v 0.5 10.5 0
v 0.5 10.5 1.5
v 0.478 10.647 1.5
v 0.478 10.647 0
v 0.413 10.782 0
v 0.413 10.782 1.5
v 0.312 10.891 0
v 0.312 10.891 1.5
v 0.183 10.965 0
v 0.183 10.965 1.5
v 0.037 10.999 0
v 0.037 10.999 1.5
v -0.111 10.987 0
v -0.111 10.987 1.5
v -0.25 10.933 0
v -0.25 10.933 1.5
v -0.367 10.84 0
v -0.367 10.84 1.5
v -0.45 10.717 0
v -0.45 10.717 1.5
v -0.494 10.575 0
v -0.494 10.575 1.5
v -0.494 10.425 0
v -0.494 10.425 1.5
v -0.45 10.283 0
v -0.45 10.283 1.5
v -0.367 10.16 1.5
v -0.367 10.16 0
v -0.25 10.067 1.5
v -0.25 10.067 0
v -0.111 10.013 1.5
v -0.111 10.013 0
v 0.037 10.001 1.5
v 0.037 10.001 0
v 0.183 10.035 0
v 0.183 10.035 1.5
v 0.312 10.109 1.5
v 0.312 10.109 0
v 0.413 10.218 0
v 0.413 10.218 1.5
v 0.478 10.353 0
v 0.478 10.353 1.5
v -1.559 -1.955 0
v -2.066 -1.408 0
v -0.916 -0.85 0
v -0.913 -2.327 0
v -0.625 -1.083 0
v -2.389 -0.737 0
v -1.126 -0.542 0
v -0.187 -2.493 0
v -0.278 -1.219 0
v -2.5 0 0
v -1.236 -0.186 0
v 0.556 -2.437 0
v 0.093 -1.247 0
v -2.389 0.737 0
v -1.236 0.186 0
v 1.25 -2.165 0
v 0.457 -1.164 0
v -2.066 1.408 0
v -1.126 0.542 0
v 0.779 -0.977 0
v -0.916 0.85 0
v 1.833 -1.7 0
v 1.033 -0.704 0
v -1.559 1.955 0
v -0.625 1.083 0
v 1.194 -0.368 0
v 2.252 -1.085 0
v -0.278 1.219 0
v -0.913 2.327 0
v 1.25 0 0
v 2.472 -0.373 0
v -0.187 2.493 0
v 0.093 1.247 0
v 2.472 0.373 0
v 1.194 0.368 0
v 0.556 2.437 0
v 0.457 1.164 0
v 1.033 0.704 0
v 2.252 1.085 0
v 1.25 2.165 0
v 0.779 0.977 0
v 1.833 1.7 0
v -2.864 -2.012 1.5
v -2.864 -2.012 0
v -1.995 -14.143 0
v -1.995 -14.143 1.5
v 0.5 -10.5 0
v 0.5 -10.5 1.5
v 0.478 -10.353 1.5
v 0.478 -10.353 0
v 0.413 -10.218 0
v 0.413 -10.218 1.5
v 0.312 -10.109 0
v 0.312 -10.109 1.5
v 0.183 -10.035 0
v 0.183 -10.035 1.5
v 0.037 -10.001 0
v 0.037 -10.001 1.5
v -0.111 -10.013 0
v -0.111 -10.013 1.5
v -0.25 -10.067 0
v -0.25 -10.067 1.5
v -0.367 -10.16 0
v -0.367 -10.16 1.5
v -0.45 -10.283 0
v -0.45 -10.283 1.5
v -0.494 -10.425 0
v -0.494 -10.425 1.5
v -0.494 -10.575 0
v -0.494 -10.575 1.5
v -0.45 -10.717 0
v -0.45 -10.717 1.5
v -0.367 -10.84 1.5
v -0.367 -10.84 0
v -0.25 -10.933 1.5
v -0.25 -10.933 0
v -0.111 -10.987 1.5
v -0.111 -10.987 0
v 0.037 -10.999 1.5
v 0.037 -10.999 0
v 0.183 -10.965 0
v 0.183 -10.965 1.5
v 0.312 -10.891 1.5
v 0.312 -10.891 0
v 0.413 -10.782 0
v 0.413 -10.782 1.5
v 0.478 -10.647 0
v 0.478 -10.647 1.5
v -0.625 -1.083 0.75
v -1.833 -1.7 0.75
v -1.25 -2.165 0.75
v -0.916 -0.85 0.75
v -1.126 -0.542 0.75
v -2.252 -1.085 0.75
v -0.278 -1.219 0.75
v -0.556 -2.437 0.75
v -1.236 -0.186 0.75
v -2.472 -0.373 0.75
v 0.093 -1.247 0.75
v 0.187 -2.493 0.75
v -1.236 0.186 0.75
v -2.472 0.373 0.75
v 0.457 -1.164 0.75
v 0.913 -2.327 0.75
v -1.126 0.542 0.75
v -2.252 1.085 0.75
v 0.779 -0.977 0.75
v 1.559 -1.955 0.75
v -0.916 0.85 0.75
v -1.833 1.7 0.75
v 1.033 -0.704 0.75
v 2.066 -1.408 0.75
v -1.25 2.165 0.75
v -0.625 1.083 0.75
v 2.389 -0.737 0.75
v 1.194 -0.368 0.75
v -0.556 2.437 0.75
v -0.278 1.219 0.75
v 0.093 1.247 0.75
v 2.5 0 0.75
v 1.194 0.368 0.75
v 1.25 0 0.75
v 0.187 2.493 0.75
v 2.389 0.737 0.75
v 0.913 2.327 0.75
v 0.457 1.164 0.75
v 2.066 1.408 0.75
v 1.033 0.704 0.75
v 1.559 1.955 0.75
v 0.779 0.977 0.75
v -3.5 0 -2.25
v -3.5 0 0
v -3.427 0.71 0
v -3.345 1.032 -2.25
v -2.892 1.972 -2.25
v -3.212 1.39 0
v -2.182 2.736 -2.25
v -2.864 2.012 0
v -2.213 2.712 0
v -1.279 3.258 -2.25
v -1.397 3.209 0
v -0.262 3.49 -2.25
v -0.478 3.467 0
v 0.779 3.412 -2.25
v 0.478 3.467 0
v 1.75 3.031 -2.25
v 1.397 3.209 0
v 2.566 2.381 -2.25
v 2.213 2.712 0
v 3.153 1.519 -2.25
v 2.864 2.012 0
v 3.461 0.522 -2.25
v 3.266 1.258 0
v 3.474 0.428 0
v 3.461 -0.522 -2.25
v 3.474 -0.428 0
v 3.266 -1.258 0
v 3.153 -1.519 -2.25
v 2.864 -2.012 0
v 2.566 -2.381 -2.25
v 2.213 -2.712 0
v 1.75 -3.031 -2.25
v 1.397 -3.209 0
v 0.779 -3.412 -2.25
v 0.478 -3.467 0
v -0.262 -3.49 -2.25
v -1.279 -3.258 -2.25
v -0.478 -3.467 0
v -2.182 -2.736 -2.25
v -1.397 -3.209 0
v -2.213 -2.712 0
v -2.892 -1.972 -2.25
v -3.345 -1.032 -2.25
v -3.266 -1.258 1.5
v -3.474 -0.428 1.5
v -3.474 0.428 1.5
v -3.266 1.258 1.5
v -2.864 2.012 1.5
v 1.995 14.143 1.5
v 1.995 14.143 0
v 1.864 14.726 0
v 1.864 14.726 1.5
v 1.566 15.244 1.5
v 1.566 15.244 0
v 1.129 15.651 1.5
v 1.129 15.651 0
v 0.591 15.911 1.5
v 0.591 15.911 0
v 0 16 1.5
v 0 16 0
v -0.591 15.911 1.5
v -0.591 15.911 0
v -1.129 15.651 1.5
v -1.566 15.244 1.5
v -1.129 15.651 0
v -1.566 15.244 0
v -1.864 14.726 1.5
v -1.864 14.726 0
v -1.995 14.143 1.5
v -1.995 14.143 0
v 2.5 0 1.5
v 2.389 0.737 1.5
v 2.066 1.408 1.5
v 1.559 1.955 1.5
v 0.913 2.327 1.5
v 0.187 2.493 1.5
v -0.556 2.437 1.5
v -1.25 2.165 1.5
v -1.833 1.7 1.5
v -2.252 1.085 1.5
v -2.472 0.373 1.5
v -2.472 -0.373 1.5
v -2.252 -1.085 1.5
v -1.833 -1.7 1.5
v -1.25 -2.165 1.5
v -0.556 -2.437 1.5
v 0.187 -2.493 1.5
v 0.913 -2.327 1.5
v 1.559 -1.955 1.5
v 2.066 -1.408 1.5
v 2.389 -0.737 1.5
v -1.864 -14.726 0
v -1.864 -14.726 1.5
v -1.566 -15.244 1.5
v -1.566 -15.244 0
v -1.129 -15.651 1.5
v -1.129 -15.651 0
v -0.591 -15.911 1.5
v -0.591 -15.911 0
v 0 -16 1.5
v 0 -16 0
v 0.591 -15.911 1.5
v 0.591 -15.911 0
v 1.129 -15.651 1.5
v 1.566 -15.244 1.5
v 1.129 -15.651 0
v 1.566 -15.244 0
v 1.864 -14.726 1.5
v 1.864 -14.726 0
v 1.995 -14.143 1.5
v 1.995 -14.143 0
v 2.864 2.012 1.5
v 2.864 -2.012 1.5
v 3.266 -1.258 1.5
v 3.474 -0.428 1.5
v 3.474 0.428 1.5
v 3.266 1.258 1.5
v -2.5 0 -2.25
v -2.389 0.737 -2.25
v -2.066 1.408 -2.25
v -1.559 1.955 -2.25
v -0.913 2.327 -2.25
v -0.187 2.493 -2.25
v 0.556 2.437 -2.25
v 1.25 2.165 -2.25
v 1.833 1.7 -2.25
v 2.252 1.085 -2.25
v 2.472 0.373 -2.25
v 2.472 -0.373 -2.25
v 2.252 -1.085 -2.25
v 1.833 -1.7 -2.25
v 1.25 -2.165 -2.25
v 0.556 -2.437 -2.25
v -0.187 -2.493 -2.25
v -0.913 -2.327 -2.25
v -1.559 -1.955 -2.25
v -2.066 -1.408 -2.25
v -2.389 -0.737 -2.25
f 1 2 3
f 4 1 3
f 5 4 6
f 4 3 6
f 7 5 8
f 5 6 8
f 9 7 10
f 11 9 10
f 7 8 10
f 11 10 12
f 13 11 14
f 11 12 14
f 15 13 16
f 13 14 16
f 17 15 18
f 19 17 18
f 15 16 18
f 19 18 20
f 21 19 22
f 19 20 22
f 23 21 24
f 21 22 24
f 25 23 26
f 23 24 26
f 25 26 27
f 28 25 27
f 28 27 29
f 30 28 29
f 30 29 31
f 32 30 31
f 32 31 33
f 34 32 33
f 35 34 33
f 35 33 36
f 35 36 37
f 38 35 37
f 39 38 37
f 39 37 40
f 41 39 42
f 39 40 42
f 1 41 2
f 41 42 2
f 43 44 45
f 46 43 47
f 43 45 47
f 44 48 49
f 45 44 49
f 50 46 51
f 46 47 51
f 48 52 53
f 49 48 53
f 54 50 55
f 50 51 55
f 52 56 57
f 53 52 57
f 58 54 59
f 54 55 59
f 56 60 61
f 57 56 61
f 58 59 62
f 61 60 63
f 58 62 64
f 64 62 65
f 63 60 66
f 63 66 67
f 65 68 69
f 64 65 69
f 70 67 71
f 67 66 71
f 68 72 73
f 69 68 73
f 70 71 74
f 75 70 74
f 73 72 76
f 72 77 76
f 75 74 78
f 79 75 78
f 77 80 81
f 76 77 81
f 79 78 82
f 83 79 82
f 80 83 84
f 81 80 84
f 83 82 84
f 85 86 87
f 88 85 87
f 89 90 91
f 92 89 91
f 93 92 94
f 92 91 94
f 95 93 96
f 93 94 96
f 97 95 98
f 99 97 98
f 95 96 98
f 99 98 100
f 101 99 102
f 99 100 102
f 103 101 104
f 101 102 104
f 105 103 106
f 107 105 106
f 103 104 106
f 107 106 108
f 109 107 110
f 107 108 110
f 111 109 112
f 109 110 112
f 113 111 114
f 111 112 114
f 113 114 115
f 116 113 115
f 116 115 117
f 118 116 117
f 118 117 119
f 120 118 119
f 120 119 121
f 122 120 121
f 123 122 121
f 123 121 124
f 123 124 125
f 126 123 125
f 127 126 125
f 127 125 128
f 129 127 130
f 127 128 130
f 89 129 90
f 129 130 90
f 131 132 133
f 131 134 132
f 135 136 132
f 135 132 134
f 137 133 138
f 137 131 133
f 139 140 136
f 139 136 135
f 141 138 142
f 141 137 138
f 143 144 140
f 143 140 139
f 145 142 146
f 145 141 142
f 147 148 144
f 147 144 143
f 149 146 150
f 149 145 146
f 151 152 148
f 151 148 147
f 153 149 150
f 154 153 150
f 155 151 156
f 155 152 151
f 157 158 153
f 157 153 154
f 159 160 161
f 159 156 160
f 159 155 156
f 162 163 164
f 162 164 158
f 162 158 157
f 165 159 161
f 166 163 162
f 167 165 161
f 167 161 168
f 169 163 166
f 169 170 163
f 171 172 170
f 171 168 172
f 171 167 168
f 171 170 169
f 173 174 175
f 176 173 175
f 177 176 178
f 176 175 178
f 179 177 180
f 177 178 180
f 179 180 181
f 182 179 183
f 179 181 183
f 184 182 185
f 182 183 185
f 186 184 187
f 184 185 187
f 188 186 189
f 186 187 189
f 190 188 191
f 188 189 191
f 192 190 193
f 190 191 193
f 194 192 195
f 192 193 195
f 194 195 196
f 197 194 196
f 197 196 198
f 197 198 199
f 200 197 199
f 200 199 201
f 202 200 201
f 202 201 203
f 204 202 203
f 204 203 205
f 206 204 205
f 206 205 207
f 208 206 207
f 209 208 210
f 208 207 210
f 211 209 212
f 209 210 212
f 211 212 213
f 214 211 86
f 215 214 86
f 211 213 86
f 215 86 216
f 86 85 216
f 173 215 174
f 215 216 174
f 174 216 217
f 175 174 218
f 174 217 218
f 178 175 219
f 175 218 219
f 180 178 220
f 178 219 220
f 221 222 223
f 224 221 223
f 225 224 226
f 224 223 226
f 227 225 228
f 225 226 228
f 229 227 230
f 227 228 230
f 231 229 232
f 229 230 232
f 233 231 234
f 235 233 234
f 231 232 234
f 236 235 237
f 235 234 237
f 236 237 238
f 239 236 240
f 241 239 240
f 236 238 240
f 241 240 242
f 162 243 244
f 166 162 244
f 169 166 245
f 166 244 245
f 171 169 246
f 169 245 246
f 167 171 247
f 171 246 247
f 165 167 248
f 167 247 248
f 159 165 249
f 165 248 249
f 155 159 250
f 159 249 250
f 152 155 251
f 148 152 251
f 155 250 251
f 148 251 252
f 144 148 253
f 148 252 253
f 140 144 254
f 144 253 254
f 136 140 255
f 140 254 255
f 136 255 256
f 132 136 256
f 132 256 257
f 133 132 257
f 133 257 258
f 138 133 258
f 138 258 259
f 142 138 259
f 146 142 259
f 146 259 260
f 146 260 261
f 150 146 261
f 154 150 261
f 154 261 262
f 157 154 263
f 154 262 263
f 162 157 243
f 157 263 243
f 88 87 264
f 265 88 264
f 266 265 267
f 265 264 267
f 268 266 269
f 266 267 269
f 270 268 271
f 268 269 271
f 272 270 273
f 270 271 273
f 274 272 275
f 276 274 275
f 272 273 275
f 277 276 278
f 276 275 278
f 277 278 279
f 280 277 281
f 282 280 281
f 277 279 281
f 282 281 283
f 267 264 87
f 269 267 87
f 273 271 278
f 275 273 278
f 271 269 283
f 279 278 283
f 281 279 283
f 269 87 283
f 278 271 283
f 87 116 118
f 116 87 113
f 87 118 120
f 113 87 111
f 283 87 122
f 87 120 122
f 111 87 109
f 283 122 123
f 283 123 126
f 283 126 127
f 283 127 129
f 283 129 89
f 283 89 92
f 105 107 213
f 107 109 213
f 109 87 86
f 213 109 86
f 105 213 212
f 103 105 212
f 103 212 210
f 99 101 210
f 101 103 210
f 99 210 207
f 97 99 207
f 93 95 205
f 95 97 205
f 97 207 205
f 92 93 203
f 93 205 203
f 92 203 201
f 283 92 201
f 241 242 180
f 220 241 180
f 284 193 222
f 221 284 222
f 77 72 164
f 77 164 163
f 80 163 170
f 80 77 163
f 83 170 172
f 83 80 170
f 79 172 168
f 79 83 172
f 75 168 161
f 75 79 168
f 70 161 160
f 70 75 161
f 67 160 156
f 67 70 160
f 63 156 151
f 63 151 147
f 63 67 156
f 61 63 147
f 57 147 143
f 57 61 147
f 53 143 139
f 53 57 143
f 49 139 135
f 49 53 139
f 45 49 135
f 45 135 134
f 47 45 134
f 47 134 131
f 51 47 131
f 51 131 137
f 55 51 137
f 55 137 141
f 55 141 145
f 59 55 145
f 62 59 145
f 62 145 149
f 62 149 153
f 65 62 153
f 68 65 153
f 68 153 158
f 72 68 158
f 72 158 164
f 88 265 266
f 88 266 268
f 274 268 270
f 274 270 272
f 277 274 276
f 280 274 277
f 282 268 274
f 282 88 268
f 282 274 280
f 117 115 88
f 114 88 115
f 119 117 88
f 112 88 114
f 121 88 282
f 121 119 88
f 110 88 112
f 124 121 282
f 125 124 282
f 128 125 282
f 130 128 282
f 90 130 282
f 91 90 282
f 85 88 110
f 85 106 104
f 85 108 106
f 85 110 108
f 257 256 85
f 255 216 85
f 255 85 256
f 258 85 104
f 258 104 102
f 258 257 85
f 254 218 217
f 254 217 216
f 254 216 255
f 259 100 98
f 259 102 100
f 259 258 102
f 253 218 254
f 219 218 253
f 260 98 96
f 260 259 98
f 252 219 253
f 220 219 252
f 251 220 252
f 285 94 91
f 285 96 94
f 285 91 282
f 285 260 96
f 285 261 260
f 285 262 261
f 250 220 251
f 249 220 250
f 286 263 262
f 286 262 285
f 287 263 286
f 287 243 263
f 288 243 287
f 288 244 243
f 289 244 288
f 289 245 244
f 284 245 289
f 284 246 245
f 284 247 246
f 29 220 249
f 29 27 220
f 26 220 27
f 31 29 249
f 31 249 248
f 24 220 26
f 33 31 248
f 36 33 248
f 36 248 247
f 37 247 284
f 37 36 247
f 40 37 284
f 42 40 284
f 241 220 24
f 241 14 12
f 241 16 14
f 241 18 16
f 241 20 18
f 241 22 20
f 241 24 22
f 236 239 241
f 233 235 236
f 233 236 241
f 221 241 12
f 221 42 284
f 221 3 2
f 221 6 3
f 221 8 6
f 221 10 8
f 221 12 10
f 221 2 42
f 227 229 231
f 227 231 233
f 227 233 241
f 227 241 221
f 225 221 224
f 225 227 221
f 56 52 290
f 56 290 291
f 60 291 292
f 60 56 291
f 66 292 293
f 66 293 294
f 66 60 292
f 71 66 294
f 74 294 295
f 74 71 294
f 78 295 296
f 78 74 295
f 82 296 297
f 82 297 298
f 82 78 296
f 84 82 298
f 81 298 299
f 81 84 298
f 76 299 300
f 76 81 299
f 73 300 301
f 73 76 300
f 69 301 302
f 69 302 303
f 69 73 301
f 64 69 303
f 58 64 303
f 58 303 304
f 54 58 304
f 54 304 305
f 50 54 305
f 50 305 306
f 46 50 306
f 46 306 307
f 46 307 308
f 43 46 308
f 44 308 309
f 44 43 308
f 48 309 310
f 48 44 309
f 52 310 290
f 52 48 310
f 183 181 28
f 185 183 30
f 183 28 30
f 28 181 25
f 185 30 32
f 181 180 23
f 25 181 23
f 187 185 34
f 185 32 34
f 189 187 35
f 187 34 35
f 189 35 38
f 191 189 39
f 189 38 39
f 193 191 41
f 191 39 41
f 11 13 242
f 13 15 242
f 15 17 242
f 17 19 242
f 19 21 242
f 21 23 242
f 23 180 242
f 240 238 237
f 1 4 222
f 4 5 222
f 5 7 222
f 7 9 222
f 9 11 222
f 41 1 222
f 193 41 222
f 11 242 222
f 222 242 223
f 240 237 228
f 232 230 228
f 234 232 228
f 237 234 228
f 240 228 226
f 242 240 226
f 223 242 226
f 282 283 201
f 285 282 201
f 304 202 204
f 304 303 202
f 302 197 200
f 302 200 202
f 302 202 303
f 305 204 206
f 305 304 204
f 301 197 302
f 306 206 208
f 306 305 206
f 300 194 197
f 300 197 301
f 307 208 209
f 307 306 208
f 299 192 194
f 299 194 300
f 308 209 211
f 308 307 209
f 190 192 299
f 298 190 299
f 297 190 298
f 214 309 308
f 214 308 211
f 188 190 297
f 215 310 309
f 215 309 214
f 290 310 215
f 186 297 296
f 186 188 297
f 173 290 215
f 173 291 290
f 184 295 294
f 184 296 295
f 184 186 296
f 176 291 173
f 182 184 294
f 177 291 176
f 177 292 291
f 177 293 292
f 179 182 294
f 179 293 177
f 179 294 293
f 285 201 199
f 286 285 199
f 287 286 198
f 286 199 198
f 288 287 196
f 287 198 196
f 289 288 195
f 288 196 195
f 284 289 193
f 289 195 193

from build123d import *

# Parameters (mm, degrees)
SKETCH1_R           = 1.2499975
BOSS_EXTRUDE1_DEPTH = 1.5
SKETCH2_R           = 0.5
CUT_EXTRUDE1_DEPTH  = 1.5
SKETCH4_R           = 3.5
SKETCH4_R_2         = 2.5
BOSS_EXTRUDE2_DEPTH = 2.25
SKETCH5_R           = 2.5
SKETCH5_R_2         = 1.2499975
CUT_EXTRUDE2_DEPTH  = 0.75


with BuildPart() as part:
    # Sketch1 → Boss-Extrude1 (new body)
    with BuildSketch(Plane.XY):
        with BuildLine():
            Line((-1.994891435, 14.142857143), (-2.863567464, 2.012456554))
            ThreePointArc((-2.863567464, 2.012456554), (-3.5, 0), (-2.863567464, -2.012456554))
            Line((-2.863567464, -2.012456554), (-1.994891435, -14.142857143))
            ThreePointArc((-1.994891435, -14.142857143), (0, -16), (1.994891435, -14.142857143))
            Line((1.994891435, -14.142857143), (2.863567464, -2.012456554))
            ThreePointArc((2.863567464, -2.012456554), (3.5, 0), (2.863567464, 2.012456554))
            Line((2.863567464, 2.012456554), (1.994891435, 14.142857143))
            ThreePointArc((1.994891435, 14.142857143), (0, 16), (-1.994891435, 14.142857143))
        make_face()
        Circle(SKETCH1_R, mode=Mode.SUBTRACT)
    extrude(amount=BOSS_EXTRUDE1_DEPTH)

    # Sketch2 → Cut-Extrude1 (cut)
    with BuildSketch(Plane.XY.offset(1.5)):
        with Locations((0, 10.5)):
            Circle(SKETCH2_R)
        with Locations((0, -10.5)):
            Circle(SKETCH2_R)
    extrude(amount=-CUT_EXTRUDE1_DEPTH, mode=Mode.SUBTRACT)

    # Sketch4 → Boss-Extrude2 (add)
    with BuildSketch(Plane(origin=(0, 0, 0), x_dir=(-1, 0, 0), z_dir=(0, 0, -1))):
        Circle(SKETCH4_R)
        Circle(SKETCH4_R_2, mode=Mode.SUBTRACT)
    extrude(amount=BOSS_EXTRUDE2_DEPTH)

    # Sketch5 → Cut-Extrude2 (cut)
    with BuildSketch(Plane.XY.offset(1.5)):
        Circle(SKETCH5_R)
        Circle(SKETCH5_R_2, mode=Mode.SUBTRACT)
    extrude(amount=-CUT_EXTRUDE2_DEPTH, mode=Mode.SUBTRACT)


solid = part.part
